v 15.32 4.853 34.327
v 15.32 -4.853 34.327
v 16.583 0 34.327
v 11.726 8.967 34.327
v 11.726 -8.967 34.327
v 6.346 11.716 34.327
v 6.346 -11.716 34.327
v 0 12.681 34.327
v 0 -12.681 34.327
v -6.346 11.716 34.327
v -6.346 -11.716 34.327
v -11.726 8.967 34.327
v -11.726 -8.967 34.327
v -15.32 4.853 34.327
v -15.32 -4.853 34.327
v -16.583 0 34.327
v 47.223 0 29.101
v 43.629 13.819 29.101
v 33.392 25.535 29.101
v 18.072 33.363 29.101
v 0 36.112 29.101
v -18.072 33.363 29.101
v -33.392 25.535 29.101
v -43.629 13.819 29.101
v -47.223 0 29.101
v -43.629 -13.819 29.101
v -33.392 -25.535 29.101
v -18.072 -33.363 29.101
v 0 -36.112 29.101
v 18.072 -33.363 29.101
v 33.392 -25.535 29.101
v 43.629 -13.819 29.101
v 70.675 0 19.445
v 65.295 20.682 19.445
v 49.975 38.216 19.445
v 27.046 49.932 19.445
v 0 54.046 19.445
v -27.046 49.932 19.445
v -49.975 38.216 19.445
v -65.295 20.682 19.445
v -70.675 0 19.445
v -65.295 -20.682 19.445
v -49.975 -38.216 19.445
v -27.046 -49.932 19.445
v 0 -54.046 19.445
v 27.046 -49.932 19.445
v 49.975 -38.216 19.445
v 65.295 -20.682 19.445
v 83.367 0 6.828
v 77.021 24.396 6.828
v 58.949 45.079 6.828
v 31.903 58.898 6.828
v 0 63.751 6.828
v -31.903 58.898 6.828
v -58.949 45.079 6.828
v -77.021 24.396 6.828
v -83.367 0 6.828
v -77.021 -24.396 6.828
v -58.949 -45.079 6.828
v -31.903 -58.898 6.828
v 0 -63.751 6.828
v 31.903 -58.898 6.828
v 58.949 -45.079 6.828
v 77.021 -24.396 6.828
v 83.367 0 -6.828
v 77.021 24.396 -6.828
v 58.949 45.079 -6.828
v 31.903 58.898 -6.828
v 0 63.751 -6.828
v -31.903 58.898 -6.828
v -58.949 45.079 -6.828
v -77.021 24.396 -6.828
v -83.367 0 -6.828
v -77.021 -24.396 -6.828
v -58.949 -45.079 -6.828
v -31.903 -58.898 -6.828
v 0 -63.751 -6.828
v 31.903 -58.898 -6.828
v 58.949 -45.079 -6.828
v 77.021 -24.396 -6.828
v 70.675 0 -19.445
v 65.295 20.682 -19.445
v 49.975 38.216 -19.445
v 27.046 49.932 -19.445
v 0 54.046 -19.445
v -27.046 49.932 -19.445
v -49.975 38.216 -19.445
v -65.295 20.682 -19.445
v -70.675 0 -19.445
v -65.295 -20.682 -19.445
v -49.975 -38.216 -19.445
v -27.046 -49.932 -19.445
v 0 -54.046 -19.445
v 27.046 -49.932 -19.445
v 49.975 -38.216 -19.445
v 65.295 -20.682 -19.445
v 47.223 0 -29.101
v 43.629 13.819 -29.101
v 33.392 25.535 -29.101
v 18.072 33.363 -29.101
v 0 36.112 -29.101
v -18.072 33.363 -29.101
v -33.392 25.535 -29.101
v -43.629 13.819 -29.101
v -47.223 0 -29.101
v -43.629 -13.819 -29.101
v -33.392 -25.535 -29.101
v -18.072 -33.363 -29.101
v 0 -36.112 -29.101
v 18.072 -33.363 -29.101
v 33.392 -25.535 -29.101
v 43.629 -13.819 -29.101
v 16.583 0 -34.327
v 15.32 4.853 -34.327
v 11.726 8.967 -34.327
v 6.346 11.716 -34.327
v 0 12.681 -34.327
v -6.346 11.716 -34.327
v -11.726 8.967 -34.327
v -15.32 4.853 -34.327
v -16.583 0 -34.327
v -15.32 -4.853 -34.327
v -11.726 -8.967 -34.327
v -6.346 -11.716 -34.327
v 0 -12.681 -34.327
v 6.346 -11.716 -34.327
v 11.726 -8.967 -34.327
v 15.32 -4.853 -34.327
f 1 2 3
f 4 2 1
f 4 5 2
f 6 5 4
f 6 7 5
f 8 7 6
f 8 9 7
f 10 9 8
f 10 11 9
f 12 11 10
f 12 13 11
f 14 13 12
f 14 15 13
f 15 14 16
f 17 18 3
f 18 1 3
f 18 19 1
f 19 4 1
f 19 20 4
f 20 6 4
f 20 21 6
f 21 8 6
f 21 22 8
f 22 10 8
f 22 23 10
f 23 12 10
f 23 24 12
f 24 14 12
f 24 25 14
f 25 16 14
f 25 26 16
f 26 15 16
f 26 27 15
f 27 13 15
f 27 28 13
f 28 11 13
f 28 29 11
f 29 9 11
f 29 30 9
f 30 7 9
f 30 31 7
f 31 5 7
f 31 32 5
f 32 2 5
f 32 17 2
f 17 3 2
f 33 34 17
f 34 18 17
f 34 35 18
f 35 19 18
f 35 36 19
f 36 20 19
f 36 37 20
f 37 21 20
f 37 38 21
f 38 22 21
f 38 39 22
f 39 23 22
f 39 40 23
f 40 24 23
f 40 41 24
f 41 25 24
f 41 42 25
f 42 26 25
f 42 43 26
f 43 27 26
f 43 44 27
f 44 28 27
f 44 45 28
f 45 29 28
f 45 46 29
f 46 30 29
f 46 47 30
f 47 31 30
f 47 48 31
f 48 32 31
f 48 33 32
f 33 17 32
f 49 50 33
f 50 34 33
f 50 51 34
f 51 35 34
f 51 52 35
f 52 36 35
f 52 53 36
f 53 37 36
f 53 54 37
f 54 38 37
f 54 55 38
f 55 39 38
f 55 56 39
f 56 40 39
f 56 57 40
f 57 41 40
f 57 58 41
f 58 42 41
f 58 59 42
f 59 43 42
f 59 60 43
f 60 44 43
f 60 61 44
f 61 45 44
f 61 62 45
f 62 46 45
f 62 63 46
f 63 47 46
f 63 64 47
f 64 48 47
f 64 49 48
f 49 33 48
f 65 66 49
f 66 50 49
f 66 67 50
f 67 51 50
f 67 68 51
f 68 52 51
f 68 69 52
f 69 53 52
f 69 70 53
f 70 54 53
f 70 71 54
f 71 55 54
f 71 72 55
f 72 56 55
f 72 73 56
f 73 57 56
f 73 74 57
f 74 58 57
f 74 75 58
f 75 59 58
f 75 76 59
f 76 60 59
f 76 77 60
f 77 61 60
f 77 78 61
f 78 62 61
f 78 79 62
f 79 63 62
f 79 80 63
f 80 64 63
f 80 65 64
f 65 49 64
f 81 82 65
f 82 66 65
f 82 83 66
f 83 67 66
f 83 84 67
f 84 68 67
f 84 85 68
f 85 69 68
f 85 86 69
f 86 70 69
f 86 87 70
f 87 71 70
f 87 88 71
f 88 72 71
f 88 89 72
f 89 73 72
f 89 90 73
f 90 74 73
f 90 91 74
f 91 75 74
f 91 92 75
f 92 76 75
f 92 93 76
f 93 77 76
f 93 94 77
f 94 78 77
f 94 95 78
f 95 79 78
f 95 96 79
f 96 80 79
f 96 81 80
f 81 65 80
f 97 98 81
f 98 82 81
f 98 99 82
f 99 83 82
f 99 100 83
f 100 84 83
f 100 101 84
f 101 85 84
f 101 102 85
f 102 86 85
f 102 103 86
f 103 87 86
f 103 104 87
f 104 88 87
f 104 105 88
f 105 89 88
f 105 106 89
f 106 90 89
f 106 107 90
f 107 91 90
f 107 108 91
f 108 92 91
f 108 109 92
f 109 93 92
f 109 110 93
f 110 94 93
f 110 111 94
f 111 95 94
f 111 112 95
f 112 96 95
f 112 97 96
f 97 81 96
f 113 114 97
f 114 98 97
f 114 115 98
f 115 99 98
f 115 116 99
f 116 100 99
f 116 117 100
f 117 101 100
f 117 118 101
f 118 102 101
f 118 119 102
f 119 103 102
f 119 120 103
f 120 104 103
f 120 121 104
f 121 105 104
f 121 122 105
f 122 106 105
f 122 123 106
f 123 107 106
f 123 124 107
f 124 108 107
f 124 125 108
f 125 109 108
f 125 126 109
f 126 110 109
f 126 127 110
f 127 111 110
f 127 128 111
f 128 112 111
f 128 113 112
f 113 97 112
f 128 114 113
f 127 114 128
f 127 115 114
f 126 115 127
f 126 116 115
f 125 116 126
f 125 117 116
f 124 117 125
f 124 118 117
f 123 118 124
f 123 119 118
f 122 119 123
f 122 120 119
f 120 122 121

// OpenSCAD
// Generated by SolidPython 1.0.1 on 2020-07-29 00:46:53


scale(v = [17, 13, 7]) {
	sphere(r = 5);
}
/***********************************************
*********      SolidPython code:      **********
************************************************
 
# import packages: SolidPython
from solid import *
from solid.utils import *
from itertools import chain, combinations, permutations


class Resize:

    def __init__(self, scad_file):
        self.scad_file = scad_file
        #self.scad_file = import_scad(scad_file)
        # cone/cylinder param:
        self.r1 = 0
        self.r2 = 0
        self.h = 0
        # rectangular prism param:
        self.w = 0
        self.l = 0
        # ellipse param:
        self.r = 0

    # import OpenScad code (file name corresponds to shape)


    # classify shape + parameters
    def assign(self, param1, param2, param3):
        if self.scad_file == 'cone.scad':
            self.r1 = param1
            self.r2 = param2
            self.h = param3
        elif self.scad_file == 'cylinder.scad':
            self.r1 = param1
            self.r2 = param2
            self.h = param3
        elif self.scad_file == 'rectangularPrism.scad':
            self.h = param1
            self.l = param2
            self.w = param3
        else:
            self.r = param1
            self.h = param2

    # resize parameters
    def iterate(self):
        x = range(3, 20, 2)
        i = 1
        if self.scad_file == 'cone.scad':
            tempList = list(permutations(x, 2))
            for temp in tempList:
                param1 = temp[0]
                param2 = temp[1]
                filepath = 'produced_scad_files/' + 'cone' + str(param1) + '_' + str(param2) + '_' + '.scad'
                scad_render_to_file(cylinder(h=param1, r1=param2, r2=0), filepath)

        elif self.scad_file == 'cylinder.scad':
            tempList = list(permutations(x, 3))
            for temp in tempList:
                param1 = temp[0]
                param2 = temp[1]
                filepath = 'produced_scad_files/' + 'cylinder' + str(param1) + '_' + str(param2) + '_' + '.scad'
                scad_render_to_file(cylinder(h=param1, r1=param2, r2=param2), filepath)

        elif self.scad_file == 'rectangularPrism.scad':
            tempList = list(permutations(x, 3))
            for temp in tempList:
                param1 = temp[0]
                param2 = temp[1]
                param3 = temp[2]
                filepath = 'produced_scad_files/' + 'rectangularPrism' + str(param1) + '_' + str(param2) + '_' + str(
                    param3) + '.scad'
                scad_render_to_file(cube(size=(param1, param2, param3)), filepath)

        elif self.scad_file == 'ellipse.scad':
            tempList = list(permutations(x, 4))
            for temp in tempList:
                param1 = temp[0]
                param2 = temp[1]
                param3 = temp[2]
                param4 = temp[3]
                filepath = 'produced_scad_files/' + 'ellipse' + str(param1) + '_' + str(param2) + '_' + str(param3) + '_' + str(param4) + '.scad'
                scad_render_to_file(scale([param1, param2, param3])(sphere(r=param4)), filepath)

    def render_to_scadfile(self):
        scad_render_to_file(scad, 'example.scad') 
 
************************************************/
